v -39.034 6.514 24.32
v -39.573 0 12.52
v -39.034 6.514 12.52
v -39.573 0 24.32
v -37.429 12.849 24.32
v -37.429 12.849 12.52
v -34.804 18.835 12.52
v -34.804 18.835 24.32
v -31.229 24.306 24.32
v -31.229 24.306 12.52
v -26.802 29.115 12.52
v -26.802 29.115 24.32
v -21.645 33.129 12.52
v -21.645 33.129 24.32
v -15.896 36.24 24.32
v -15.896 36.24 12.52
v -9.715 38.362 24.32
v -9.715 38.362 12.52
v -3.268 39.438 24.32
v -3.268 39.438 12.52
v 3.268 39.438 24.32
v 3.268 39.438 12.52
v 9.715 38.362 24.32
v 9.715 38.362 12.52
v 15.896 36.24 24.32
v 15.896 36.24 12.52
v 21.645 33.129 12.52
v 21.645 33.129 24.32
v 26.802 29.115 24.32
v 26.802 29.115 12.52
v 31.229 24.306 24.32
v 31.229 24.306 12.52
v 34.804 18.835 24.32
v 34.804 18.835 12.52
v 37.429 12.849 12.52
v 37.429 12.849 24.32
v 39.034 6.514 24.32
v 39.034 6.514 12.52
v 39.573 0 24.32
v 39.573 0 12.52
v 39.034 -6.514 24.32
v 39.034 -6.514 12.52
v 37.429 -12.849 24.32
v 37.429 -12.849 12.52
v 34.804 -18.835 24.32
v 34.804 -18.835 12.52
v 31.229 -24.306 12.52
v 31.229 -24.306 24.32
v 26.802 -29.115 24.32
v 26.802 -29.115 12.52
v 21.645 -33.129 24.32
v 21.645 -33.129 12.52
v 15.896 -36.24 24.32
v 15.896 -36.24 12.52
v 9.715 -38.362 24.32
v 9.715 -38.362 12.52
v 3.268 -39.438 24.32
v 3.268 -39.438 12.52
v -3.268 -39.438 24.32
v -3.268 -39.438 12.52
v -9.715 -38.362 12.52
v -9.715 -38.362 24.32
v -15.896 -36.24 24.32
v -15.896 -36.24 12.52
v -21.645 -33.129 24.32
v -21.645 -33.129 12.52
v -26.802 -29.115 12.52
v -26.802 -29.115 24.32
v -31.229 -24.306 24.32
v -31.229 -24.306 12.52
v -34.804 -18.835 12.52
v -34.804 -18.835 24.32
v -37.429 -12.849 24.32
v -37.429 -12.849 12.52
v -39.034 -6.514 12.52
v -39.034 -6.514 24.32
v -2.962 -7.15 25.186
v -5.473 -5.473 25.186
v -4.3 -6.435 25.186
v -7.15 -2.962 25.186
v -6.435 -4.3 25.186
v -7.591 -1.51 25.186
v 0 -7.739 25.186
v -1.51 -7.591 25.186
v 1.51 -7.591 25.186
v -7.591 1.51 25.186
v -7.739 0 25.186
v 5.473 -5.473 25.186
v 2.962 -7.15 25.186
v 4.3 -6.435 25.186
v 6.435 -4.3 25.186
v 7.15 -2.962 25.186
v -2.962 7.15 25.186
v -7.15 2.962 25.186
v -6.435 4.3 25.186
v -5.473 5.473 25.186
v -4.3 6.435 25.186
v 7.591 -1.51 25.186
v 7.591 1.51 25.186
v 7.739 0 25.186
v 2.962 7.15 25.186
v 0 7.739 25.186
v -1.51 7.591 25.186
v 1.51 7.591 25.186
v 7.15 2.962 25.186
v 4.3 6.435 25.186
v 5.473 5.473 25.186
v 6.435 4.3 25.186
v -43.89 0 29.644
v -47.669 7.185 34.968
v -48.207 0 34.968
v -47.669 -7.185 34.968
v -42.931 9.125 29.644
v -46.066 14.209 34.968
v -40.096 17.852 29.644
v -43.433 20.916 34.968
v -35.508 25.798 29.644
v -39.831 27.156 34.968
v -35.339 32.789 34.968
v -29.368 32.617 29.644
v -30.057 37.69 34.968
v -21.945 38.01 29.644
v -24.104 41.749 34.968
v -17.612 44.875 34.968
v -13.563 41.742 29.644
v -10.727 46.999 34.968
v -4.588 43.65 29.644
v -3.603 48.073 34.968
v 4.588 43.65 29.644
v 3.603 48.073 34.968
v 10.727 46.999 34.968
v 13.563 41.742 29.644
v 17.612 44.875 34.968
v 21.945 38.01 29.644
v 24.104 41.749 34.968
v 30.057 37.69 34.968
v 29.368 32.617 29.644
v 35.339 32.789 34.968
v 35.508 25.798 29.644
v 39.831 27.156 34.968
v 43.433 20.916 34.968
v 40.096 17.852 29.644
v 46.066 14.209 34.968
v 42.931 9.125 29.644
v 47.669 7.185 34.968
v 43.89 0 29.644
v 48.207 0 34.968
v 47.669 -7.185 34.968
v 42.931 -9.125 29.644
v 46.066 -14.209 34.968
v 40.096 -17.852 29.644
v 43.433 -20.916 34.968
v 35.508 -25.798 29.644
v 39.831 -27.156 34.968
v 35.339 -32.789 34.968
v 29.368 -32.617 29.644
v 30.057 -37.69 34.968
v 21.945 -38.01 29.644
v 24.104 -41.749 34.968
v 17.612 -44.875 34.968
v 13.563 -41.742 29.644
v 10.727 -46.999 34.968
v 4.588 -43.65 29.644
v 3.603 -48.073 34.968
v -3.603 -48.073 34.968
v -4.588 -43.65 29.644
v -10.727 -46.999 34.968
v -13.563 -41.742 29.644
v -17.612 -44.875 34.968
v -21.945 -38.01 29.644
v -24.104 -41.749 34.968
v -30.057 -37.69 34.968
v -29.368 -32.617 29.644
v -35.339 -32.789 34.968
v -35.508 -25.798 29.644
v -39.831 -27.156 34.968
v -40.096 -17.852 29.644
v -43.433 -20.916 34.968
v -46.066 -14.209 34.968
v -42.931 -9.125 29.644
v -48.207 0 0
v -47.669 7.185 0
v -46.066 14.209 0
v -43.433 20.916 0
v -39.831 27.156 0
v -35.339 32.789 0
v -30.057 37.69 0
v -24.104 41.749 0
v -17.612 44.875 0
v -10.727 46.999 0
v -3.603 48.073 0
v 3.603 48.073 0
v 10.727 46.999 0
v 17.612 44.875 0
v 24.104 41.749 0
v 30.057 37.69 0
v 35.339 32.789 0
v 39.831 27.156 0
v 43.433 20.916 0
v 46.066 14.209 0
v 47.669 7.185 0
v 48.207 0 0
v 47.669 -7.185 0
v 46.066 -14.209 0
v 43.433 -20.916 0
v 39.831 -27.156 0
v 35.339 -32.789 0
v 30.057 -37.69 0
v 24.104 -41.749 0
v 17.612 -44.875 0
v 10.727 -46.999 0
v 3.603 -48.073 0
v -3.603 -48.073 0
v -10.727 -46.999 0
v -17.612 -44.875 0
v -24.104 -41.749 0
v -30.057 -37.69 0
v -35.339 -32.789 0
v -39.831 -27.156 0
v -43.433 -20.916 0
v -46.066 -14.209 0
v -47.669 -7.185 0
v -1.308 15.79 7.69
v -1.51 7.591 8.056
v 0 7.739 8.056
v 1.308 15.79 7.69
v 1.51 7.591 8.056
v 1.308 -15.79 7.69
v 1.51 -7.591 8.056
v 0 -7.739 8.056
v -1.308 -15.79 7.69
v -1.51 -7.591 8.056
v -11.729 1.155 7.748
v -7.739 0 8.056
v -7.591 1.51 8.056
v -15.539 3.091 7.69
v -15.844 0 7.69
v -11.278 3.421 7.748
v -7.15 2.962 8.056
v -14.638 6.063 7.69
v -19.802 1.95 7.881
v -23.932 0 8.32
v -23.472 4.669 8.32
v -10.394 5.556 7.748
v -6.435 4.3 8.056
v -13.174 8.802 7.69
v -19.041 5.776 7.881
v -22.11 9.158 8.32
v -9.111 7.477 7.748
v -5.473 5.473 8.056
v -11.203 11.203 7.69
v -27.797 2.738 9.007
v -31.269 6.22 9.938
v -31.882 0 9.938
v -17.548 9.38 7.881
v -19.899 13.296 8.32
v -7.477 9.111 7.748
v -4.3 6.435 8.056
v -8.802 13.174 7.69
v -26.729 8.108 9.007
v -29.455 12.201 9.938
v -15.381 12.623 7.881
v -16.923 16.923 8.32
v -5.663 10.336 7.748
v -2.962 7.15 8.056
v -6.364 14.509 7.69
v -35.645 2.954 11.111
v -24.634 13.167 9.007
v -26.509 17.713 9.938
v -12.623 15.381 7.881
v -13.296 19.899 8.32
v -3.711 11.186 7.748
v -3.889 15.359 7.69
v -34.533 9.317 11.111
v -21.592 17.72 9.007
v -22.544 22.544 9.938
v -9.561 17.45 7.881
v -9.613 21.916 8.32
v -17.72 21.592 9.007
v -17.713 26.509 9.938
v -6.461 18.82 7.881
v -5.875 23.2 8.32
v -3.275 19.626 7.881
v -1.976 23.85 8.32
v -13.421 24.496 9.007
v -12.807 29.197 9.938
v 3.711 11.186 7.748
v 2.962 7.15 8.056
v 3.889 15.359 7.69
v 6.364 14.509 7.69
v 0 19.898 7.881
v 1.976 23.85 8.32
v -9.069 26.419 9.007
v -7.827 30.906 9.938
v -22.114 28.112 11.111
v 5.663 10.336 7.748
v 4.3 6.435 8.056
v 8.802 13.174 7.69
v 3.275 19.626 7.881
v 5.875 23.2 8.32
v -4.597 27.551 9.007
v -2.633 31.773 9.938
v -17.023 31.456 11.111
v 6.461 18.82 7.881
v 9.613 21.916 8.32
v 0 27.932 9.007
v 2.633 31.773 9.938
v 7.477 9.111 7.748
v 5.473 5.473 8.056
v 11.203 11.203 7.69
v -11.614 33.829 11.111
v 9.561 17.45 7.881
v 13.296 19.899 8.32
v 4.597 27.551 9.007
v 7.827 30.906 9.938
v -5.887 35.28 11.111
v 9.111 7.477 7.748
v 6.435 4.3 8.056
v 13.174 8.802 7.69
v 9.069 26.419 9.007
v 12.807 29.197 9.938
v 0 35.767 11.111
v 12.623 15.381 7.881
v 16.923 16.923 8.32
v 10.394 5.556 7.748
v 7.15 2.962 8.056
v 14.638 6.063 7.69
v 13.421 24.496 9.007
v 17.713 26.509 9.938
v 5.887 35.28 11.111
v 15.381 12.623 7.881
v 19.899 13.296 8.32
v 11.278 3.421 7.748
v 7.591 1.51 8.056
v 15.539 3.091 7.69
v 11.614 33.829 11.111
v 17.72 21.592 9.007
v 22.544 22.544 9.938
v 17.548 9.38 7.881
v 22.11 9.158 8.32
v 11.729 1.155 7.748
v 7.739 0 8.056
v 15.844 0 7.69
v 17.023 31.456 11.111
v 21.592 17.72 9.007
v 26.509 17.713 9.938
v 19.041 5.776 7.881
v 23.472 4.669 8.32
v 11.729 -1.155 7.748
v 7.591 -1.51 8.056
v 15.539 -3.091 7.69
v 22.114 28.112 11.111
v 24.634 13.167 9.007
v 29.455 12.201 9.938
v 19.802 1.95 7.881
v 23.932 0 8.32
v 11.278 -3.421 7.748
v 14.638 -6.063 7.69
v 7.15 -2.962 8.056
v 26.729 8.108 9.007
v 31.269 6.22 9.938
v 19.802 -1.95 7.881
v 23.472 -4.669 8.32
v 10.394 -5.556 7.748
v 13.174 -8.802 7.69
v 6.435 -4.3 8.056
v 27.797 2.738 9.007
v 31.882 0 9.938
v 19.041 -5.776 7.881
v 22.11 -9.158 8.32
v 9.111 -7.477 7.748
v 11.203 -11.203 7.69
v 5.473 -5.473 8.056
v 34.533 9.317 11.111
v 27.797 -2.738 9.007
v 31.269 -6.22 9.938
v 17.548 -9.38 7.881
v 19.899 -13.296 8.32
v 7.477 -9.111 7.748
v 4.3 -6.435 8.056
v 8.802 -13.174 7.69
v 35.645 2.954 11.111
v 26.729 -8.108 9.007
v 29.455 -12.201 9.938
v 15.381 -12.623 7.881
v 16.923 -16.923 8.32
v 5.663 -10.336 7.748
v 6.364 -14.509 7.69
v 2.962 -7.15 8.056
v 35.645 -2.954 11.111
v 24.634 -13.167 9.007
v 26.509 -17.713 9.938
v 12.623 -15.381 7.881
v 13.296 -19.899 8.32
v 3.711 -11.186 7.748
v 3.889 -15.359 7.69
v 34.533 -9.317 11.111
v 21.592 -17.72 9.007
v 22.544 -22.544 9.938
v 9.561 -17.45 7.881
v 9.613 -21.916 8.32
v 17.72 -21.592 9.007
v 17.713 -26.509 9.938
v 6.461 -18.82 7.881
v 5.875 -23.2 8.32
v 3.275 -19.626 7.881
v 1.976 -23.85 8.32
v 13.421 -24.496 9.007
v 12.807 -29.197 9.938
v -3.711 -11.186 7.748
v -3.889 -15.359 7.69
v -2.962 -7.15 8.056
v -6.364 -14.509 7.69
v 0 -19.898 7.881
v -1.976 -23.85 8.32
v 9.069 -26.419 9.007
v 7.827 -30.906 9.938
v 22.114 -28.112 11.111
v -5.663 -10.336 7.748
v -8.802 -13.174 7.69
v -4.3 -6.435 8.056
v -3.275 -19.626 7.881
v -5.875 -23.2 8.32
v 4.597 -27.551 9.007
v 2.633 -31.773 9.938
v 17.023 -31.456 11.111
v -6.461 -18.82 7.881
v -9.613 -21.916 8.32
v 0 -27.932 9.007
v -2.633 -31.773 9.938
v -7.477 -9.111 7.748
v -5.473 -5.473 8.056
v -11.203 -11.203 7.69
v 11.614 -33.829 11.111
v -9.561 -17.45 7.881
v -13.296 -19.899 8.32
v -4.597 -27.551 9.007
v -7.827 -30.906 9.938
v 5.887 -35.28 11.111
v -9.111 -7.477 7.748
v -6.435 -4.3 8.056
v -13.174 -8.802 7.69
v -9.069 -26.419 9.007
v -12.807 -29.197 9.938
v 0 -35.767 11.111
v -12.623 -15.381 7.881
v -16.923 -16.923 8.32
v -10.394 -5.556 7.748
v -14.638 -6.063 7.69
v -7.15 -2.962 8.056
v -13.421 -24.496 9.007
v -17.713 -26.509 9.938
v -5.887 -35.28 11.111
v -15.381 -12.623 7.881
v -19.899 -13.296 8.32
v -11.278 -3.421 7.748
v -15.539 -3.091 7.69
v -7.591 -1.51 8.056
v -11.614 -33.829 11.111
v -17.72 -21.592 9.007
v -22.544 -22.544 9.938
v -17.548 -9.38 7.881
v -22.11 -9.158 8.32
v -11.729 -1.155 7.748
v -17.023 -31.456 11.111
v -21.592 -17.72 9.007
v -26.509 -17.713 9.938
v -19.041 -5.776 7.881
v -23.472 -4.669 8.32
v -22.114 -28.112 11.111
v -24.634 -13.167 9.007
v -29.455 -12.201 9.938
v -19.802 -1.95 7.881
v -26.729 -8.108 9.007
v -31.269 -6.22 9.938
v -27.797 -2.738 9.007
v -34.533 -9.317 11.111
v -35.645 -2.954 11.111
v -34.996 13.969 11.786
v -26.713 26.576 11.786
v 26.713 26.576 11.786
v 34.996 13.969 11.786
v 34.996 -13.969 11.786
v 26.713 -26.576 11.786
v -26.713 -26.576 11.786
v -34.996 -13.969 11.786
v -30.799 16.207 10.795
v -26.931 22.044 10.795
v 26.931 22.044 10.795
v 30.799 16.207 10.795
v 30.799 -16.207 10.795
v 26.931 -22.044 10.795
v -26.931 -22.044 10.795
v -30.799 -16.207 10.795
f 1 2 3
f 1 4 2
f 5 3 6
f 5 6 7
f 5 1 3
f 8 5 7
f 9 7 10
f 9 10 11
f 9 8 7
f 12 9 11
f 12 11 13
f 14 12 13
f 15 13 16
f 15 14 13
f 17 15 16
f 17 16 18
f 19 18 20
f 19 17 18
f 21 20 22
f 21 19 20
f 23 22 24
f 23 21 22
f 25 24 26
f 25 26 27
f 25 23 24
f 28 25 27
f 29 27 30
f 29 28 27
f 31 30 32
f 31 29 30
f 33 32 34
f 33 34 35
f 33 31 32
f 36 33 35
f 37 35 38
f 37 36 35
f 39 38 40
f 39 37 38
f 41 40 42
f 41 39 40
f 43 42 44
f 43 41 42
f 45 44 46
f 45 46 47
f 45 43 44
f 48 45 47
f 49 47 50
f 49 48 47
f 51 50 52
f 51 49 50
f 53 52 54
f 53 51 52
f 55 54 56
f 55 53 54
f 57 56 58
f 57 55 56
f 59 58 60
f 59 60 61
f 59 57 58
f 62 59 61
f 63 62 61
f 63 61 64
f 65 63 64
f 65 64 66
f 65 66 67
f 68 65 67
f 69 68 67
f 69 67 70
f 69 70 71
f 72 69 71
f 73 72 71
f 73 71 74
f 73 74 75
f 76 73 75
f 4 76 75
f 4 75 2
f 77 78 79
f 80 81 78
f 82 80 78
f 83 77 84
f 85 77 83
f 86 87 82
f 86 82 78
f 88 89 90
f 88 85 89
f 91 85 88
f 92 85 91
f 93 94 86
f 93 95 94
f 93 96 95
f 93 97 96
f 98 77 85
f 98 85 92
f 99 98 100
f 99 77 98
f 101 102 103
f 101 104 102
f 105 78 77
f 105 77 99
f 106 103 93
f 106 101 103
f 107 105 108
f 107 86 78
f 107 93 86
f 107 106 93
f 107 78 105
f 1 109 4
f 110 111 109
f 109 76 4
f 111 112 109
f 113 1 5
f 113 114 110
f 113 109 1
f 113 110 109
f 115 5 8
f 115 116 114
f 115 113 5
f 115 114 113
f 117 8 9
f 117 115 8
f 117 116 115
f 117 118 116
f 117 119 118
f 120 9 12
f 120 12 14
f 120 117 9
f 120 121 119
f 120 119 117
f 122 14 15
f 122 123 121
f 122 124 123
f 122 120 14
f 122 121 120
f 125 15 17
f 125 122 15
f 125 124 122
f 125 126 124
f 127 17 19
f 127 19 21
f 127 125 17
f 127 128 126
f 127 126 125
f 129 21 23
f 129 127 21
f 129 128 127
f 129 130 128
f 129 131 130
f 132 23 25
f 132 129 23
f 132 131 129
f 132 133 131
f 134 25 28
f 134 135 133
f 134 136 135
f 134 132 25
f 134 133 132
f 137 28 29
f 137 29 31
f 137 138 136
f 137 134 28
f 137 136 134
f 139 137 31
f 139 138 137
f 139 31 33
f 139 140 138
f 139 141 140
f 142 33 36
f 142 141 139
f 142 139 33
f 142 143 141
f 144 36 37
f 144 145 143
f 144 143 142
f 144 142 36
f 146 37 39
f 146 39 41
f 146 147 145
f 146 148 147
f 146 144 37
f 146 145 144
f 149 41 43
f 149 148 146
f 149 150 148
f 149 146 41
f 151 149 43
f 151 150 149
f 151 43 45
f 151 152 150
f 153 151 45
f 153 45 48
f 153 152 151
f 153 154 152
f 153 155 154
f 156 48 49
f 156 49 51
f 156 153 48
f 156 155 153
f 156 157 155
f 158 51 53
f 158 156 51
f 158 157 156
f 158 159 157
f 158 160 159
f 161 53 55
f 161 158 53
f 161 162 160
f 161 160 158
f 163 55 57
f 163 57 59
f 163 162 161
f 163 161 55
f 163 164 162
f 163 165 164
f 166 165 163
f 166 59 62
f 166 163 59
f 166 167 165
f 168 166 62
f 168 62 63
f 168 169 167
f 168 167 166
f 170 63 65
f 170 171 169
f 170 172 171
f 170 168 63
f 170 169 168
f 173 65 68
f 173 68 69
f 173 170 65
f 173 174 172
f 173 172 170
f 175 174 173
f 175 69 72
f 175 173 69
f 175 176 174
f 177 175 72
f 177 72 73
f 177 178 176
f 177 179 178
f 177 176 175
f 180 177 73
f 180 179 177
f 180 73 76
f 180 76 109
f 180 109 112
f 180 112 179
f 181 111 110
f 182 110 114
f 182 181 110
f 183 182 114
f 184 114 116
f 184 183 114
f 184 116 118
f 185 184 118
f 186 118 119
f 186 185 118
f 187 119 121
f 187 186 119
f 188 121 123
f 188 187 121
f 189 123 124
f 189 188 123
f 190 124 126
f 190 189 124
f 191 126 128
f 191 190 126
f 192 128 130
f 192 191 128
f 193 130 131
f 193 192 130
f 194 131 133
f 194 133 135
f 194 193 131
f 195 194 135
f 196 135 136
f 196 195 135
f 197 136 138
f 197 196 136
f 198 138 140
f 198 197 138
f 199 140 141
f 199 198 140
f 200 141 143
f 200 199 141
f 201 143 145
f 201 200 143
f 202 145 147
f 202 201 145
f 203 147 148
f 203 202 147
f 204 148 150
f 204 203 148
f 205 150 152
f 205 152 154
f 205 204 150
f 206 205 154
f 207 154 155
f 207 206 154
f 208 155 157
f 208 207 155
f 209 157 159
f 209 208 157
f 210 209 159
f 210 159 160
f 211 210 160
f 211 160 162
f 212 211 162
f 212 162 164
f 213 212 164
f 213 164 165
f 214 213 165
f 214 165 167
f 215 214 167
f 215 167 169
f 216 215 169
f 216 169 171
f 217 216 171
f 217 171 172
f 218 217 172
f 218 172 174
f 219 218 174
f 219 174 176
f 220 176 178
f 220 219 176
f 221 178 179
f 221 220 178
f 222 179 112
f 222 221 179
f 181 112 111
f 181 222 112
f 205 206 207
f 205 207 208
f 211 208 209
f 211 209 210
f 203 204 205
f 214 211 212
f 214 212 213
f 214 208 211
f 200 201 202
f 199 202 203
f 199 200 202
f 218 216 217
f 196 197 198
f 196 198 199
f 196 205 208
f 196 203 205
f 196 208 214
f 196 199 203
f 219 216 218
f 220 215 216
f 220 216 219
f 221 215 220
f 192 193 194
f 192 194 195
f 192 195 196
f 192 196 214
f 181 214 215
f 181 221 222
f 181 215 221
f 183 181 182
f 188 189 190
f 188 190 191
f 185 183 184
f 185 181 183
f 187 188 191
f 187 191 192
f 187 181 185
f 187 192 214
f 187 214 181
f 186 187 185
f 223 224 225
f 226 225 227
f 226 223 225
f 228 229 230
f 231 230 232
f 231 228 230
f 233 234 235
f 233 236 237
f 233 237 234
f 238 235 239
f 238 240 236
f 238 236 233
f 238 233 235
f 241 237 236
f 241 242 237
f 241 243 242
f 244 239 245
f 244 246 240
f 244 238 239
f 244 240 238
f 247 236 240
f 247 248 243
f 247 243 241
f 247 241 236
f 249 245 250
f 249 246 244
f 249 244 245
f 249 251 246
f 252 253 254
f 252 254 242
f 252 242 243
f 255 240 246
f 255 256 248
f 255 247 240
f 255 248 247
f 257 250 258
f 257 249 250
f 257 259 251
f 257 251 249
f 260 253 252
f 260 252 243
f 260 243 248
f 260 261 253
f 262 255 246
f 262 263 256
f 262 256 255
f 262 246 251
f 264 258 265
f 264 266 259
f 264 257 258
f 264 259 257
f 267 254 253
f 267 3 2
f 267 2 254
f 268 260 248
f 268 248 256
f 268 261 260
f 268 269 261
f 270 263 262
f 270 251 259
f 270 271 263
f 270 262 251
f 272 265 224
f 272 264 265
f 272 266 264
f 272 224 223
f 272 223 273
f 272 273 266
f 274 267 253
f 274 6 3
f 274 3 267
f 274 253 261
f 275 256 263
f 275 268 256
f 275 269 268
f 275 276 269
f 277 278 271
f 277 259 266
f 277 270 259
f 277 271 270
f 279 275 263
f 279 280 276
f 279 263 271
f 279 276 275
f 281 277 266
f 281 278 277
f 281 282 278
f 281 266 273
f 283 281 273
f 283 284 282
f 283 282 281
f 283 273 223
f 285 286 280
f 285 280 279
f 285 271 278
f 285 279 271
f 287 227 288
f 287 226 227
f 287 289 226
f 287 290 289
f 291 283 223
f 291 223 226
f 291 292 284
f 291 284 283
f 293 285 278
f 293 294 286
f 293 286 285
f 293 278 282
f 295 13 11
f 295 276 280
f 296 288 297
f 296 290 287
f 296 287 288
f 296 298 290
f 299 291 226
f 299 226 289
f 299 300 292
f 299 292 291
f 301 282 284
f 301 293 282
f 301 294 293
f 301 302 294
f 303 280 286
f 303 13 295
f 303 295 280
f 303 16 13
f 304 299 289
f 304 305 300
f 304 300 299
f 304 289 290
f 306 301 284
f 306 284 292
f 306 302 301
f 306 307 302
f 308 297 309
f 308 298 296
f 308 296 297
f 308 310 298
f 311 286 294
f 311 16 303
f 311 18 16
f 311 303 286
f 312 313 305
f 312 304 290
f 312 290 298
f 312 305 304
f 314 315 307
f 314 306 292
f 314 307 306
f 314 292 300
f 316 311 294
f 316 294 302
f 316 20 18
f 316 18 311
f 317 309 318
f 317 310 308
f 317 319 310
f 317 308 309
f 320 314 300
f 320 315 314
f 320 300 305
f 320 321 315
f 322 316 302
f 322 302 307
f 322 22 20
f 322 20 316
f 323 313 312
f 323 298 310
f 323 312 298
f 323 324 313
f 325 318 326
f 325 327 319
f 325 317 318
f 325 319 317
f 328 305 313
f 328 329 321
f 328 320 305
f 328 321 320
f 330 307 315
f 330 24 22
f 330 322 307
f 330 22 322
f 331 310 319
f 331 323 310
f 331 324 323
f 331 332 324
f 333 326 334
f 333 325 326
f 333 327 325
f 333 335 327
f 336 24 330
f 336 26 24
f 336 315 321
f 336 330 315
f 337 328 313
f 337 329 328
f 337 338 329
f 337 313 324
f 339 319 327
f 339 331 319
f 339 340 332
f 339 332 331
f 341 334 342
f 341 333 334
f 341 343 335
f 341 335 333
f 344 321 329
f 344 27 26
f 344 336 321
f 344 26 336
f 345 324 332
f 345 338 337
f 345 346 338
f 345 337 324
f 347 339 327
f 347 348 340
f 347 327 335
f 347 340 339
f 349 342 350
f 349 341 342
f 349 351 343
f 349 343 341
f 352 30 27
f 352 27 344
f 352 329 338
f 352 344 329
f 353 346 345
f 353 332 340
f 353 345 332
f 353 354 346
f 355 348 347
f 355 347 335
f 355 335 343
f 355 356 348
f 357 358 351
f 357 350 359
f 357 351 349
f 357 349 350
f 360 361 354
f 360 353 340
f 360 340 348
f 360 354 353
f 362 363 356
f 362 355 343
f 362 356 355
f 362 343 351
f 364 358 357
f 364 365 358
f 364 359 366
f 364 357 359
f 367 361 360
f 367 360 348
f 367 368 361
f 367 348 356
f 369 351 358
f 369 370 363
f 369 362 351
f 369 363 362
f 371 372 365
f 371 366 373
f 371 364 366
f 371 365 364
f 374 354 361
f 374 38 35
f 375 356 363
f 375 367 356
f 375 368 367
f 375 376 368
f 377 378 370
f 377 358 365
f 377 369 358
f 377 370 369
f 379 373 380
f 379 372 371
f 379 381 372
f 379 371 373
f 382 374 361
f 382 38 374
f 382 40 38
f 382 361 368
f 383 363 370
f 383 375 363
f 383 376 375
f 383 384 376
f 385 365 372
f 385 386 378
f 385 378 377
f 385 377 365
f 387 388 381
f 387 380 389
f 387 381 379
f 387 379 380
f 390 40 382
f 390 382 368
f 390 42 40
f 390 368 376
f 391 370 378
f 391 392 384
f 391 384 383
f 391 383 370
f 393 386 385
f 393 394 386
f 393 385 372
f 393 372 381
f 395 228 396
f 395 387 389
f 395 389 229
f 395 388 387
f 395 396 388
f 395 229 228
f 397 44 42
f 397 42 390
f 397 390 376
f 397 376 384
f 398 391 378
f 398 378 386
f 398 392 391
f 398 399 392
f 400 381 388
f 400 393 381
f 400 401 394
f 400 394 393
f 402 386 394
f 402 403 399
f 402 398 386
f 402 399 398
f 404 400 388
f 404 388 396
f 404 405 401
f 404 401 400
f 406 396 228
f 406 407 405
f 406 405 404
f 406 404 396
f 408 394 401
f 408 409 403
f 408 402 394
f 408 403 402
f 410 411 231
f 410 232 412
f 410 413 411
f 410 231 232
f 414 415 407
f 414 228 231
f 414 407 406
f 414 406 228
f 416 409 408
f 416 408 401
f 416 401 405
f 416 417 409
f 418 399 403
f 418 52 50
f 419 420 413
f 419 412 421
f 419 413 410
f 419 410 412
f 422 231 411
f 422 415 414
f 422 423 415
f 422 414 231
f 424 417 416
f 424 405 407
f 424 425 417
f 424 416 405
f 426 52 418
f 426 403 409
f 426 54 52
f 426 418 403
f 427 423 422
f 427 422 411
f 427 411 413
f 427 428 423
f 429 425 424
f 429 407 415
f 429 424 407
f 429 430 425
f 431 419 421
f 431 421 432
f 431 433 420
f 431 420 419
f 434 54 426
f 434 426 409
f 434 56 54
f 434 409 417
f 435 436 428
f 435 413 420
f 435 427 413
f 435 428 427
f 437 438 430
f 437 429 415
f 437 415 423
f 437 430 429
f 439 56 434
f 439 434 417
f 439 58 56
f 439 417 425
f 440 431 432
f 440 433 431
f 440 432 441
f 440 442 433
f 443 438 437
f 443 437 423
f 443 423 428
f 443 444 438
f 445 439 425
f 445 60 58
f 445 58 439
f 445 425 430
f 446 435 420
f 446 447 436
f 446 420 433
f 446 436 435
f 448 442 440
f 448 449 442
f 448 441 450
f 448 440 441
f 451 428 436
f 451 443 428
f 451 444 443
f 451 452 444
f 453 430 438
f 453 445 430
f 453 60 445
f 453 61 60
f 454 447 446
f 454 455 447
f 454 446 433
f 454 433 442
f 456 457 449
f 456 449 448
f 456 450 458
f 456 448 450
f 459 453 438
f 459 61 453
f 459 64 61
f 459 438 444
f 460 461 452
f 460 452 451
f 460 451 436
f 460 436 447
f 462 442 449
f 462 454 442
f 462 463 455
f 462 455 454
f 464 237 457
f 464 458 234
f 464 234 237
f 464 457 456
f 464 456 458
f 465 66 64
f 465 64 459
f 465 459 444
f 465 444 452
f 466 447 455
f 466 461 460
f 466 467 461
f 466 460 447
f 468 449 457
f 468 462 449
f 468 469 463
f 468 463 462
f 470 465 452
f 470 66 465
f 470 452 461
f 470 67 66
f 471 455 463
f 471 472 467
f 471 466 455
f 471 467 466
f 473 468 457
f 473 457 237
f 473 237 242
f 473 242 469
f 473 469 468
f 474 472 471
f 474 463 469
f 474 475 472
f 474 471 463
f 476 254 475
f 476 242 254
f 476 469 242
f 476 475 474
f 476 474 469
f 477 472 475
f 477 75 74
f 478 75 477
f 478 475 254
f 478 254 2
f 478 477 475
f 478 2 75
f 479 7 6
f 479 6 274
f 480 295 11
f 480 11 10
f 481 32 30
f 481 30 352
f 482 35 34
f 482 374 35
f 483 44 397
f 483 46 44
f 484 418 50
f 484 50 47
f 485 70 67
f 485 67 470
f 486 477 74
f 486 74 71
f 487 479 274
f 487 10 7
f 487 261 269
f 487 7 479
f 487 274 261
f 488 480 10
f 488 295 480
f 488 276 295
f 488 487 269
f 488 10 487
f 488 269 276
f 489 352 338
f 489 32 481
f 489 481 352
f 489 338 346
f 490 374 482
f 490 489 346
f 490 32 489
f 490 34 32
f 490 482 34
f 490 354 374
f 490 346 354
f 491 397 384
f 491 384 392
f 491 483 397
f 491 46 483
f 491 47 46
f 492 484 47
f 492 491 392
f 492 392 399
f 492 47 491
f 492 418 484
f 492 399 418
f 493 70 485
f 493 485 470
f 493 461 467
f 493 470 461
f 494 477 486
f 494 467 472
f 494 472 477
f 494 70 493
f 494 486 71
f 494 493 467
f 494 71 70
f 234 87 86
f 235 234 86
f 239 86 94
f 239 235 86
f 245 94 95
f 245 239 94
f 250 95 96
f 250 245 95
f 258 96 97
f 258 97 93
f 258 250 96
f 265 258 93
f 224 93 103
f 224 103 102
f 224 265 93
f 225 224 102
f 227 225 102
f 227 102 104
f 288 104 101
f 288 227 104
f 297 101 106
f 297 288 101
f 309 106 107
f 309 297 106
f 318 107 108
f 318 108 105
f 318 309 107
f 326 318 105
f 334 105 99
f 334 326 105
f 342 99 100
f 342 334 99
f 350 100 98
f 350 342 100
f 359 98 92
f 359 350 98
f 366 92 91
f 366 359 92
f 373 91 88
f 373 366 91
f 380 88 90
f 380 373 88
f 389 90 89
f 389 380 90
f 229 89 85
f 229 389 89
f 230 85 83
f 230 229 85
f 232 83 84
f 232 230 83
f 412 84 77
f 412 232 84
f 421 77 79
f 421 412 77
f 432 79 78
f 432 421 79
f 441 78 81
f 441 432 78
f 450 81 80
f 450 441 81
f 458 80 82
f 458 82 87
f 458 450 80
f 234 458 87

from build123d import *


with BuildPart() as f1:
    # F0 (on Front) → F1 (revolve)
    with BuildSketch(Plane.XZ):
        with BuildLine():
            Line((-48.207466, 12.51955), (-48.207466, 0))
            Line((-48.207466, 0), (0, 0))
            Line((0, 0), (0, 9.353687))
            Line((0, 9.353687), (0, 25.185656))
            Line((0, 25.185656), (-7.73931, 25.185656))
            Line((-7.73931, 25.185656), (-7.73931, 8.055973))
            ThreePointArc((-7.73931, 8.055973), (-23.932162, 8.32034), (-39.573293, 12.51955))
            Line((-39.573293, 12.51955), (-39.573293, 24.319587))
            Line((-39.573293, 24.319587), (-48.207466, 34.968402))
            Line((-48.207466, 34.968402), (-48.207466, 24.319587))
            Line((-48.207466, 24.319587), (-48.207466, 12.51955))
        make_face()
    revolve(axis=Axis((0, 0, 17.269671), (0, 0, -1)))


solid = f1.part
